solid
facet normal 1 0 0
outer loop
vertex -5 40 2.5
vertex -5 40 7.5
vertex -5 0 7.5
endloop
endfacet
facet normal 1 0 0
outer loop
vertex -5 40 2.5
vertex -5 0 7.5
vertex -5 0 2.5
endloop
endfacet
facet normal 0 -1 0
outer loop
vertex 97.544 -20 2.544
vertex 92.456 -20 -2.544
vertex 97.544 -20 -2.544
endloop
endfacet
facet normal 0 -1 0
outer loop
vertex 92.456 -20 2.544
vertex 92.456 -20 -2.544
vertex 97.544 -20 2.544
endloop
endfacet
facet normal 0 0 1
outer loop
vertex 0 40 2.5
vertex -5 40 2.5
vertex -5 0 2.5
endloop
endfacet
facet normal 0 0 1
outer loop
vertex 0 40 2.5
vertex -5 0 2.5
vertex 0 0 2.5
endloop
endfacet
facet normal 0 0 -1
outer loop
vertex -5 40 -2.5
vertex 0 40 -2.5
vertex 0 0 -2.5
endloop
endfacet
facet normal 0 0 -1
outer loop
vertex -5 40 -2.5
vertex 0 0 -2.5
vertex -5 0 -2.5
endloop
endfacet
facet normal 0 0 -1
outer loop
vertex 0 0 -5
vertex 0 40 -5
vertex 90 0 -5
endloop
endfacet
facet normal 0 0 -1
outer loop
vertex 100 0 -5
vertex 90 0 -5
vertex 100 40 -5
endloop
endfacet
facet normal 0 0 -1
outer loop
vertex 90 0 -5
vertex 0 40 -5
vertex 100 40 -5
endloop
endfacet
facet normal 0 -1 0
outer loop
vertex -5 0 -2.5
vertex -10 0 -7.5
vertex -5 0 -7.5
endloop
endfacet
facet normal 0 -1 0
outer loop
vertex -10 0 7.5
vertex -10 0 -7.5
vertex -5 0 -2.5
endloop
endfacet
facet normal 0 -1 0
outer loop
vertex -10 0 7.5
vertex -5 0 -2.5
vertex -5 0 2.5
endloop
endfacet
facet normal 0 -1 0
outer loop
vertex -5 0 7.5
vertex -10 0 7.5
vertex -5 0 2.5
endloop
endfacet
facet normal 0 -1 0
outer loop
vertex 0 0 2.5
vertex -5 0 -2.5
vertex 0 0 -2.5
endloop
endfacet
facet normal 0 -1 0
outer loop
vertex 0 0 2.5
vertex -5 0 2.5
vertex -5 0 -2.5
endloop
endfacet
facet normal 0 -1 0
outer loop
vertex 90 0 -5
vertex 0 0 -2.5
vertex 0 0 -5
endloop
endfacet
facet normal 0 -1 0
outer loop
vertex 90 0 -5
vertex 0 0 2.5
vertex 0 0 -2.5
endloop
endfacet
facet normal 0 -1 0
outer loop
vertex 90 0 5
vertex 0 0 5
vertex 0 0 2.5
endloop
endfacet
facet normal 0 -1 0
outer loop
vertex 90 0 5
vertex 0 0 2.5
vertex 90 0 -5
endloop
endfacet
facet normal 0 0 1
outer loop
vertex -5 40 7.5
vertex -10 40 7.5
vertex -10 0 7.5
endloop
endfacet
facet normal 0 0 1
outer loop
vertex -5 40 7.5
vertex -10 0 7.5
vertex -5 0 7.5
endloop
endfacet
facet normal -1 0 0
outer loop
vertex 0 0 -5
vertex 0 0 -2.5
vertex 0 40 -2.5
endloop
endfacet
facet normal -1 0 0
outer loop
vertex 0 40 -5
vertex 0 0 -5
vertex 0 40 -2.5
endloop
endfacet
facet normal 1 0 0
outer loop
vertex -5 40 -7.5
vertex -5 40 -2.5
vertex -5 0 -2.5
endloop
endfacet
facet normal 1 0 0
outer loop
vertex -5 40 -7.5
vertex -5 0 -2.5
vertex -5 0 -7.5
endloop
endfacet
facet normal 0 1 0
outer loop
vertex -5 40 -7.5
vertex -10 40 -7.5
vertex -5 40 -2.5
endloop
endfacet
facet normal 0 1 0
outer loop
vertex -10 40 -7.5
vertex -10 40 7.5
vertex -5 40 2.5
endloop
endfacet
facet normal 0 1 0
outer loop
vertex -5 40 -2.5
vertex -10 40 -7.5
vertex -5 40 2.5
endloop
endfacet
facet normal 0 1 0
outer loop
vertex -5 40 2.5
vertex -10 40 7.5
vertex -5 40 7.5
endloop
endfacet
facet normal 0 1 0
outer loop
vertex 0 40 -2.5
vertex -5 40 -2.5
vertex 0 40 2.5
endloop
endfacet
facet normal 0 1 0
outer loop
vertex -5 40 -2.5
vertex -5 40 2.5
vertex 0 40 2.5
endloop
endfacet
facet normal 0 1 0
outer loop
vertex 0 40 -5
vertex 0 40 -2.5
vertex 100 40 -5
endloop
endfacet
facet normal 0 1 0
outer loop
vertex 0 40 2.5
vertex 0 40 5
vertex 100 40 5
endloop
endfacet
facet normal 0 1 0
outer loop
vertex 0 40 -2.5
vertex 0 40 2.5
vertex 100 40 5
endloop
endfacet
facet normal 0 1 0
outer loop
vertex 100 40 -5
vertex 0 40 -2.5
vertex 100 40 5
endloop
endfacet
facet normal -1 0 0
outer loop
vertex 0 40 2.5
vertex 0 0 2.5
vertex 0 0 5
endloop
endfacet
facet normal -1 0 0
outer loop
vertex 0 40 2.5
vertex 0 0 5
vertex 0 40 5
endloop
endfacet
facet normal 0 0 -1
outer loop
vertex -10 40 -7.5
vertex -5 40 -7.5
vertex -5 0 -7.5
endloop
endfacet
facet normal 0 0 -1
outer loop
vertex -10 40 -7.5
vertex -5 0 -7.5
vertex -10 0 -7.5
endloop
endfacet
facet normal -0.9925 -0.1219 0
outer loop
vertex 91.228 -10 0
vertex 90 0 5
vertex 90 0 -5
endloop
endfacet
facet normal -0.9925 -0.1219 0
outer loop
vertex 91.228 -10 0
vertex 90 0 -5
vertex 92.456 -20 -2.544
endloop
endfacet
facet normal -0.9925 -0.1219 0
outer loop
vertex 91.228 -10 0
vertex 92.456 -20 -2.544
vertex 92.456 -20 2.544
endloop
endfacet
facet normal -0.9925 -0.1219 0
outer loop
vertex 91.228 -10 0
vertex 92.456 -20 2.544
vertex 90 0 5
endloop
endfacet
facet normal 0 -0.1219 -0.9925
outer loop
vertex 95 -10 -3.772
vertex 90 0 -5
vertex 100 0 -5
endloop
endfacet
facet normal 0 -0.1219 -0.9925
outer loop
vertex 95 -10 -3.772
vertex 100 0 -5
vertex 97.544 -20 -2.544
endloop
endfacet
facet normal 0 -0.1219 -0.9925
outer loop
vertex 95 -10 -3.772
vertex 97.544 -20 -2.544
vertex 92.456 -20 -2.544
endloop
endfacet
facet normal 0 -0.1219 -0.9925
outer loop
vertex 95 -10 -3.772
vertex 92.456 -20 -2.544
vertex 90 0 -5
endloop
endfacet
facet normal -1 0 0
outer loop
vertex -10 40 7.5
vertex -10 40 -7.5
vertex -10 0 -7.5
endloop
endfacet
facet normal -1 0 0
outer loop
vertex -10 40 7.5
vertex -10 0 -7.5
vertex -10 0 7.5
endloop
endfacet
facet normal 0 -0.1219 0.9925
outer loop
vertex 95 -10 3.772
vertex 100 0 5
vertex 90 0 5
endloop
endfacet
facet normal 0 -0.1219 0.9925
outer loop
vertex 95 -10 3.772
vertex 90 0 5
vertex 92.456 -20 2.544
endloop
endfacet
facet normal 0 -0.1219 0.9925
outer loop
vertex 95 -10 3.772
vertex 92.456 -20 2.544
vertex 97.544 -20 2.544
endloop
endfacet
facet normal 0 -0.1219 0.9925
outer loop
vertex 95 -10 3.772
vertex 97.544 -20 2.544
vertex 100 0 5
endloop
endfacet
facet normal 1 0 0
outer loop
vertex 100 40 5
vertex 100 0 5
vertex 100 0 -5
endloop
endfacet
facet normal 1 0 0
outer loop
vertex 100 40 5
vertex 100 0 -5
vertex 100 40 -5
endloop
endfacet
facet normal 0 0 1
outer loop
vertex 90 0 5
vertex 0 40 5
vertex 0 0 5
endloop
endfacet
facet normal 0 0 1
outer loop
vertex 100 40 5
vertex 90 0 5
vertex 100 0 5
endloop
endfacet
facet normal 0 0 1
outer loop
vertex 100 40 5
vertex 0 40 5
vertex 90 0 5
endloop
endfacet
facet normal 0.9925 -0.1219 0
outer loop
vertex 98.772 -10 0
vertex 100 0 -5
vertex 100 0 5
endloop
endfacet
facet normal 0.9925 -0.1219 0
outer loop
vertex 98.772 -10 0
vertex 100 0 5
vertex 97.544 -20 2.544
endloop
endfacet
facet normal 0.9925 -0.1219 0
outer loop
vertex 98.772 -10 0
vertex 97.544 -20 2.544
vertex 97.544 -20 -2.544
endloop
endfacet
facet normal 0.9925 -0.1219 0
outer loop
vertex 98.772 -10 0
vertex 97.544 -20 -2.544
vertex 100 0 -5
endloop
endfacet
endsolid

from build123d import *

# Parameters (mm, degrees)
BOSS_EXTRUDE1_DEPTH      = 40
SKETCH3_W                = 100
SKETCH3_H                = 40
BOSS_EXTRUDE2_DEPTH      = 5
BOSS_EXTRUDE2_DEPTH_BACK = 5
SKETCH4_W                = 10
SKETCH4_H                = 10
BOSS_EXTRUDE3_DEPTH      = 20
BOSS_EXTRUDE3_TAPER      = 7


with BuildPart() as part:
    # Sketch2 → Boss-Extrude1 (new body)
    with BuildSketch(Plane(origin=(0, 0, 0), x_dir=(1, 0, 0), z_dir=(0, 1, 0))):
        Polygon((-10, 7.5), (-10, -7.5), (-5, -7.5), (-5, -2.5), (0, -2.5), (0, 2.5), (-5, 2.5), (-5, 7.5), align=None)
    extrude(amount=BOSS_EXTRUDE1_DEPTH)

    # Sketch3 → Boss-Extrude2 (add, two sides)
    with BuildSketch(Plane.XY) as boss_extrude2_sk:
        with Locations((50, 20)):
            Rectangle(SKETCH3_W, SKETCH3_H)
    extrude(amount=BOSS_EXTRUDE2_DEPTH)
    extrude(boss_extrude2_sk.sketch, amount=-BOSS_EXTRUDE2_DEPTH_BACK)

    # Sketch4 → Boss-Extrude3 (add)
    with BuildSketch(Plane.XZ):
        with Locations((95, 0)):
            Rectangle(SKETCH4_W, SKETCH4_H)
    extrude(amount=BOSS_EXTRUDE3_DEPTH, taper=BOSS_EXTRUDE3_TAPER)


solid = part.part
